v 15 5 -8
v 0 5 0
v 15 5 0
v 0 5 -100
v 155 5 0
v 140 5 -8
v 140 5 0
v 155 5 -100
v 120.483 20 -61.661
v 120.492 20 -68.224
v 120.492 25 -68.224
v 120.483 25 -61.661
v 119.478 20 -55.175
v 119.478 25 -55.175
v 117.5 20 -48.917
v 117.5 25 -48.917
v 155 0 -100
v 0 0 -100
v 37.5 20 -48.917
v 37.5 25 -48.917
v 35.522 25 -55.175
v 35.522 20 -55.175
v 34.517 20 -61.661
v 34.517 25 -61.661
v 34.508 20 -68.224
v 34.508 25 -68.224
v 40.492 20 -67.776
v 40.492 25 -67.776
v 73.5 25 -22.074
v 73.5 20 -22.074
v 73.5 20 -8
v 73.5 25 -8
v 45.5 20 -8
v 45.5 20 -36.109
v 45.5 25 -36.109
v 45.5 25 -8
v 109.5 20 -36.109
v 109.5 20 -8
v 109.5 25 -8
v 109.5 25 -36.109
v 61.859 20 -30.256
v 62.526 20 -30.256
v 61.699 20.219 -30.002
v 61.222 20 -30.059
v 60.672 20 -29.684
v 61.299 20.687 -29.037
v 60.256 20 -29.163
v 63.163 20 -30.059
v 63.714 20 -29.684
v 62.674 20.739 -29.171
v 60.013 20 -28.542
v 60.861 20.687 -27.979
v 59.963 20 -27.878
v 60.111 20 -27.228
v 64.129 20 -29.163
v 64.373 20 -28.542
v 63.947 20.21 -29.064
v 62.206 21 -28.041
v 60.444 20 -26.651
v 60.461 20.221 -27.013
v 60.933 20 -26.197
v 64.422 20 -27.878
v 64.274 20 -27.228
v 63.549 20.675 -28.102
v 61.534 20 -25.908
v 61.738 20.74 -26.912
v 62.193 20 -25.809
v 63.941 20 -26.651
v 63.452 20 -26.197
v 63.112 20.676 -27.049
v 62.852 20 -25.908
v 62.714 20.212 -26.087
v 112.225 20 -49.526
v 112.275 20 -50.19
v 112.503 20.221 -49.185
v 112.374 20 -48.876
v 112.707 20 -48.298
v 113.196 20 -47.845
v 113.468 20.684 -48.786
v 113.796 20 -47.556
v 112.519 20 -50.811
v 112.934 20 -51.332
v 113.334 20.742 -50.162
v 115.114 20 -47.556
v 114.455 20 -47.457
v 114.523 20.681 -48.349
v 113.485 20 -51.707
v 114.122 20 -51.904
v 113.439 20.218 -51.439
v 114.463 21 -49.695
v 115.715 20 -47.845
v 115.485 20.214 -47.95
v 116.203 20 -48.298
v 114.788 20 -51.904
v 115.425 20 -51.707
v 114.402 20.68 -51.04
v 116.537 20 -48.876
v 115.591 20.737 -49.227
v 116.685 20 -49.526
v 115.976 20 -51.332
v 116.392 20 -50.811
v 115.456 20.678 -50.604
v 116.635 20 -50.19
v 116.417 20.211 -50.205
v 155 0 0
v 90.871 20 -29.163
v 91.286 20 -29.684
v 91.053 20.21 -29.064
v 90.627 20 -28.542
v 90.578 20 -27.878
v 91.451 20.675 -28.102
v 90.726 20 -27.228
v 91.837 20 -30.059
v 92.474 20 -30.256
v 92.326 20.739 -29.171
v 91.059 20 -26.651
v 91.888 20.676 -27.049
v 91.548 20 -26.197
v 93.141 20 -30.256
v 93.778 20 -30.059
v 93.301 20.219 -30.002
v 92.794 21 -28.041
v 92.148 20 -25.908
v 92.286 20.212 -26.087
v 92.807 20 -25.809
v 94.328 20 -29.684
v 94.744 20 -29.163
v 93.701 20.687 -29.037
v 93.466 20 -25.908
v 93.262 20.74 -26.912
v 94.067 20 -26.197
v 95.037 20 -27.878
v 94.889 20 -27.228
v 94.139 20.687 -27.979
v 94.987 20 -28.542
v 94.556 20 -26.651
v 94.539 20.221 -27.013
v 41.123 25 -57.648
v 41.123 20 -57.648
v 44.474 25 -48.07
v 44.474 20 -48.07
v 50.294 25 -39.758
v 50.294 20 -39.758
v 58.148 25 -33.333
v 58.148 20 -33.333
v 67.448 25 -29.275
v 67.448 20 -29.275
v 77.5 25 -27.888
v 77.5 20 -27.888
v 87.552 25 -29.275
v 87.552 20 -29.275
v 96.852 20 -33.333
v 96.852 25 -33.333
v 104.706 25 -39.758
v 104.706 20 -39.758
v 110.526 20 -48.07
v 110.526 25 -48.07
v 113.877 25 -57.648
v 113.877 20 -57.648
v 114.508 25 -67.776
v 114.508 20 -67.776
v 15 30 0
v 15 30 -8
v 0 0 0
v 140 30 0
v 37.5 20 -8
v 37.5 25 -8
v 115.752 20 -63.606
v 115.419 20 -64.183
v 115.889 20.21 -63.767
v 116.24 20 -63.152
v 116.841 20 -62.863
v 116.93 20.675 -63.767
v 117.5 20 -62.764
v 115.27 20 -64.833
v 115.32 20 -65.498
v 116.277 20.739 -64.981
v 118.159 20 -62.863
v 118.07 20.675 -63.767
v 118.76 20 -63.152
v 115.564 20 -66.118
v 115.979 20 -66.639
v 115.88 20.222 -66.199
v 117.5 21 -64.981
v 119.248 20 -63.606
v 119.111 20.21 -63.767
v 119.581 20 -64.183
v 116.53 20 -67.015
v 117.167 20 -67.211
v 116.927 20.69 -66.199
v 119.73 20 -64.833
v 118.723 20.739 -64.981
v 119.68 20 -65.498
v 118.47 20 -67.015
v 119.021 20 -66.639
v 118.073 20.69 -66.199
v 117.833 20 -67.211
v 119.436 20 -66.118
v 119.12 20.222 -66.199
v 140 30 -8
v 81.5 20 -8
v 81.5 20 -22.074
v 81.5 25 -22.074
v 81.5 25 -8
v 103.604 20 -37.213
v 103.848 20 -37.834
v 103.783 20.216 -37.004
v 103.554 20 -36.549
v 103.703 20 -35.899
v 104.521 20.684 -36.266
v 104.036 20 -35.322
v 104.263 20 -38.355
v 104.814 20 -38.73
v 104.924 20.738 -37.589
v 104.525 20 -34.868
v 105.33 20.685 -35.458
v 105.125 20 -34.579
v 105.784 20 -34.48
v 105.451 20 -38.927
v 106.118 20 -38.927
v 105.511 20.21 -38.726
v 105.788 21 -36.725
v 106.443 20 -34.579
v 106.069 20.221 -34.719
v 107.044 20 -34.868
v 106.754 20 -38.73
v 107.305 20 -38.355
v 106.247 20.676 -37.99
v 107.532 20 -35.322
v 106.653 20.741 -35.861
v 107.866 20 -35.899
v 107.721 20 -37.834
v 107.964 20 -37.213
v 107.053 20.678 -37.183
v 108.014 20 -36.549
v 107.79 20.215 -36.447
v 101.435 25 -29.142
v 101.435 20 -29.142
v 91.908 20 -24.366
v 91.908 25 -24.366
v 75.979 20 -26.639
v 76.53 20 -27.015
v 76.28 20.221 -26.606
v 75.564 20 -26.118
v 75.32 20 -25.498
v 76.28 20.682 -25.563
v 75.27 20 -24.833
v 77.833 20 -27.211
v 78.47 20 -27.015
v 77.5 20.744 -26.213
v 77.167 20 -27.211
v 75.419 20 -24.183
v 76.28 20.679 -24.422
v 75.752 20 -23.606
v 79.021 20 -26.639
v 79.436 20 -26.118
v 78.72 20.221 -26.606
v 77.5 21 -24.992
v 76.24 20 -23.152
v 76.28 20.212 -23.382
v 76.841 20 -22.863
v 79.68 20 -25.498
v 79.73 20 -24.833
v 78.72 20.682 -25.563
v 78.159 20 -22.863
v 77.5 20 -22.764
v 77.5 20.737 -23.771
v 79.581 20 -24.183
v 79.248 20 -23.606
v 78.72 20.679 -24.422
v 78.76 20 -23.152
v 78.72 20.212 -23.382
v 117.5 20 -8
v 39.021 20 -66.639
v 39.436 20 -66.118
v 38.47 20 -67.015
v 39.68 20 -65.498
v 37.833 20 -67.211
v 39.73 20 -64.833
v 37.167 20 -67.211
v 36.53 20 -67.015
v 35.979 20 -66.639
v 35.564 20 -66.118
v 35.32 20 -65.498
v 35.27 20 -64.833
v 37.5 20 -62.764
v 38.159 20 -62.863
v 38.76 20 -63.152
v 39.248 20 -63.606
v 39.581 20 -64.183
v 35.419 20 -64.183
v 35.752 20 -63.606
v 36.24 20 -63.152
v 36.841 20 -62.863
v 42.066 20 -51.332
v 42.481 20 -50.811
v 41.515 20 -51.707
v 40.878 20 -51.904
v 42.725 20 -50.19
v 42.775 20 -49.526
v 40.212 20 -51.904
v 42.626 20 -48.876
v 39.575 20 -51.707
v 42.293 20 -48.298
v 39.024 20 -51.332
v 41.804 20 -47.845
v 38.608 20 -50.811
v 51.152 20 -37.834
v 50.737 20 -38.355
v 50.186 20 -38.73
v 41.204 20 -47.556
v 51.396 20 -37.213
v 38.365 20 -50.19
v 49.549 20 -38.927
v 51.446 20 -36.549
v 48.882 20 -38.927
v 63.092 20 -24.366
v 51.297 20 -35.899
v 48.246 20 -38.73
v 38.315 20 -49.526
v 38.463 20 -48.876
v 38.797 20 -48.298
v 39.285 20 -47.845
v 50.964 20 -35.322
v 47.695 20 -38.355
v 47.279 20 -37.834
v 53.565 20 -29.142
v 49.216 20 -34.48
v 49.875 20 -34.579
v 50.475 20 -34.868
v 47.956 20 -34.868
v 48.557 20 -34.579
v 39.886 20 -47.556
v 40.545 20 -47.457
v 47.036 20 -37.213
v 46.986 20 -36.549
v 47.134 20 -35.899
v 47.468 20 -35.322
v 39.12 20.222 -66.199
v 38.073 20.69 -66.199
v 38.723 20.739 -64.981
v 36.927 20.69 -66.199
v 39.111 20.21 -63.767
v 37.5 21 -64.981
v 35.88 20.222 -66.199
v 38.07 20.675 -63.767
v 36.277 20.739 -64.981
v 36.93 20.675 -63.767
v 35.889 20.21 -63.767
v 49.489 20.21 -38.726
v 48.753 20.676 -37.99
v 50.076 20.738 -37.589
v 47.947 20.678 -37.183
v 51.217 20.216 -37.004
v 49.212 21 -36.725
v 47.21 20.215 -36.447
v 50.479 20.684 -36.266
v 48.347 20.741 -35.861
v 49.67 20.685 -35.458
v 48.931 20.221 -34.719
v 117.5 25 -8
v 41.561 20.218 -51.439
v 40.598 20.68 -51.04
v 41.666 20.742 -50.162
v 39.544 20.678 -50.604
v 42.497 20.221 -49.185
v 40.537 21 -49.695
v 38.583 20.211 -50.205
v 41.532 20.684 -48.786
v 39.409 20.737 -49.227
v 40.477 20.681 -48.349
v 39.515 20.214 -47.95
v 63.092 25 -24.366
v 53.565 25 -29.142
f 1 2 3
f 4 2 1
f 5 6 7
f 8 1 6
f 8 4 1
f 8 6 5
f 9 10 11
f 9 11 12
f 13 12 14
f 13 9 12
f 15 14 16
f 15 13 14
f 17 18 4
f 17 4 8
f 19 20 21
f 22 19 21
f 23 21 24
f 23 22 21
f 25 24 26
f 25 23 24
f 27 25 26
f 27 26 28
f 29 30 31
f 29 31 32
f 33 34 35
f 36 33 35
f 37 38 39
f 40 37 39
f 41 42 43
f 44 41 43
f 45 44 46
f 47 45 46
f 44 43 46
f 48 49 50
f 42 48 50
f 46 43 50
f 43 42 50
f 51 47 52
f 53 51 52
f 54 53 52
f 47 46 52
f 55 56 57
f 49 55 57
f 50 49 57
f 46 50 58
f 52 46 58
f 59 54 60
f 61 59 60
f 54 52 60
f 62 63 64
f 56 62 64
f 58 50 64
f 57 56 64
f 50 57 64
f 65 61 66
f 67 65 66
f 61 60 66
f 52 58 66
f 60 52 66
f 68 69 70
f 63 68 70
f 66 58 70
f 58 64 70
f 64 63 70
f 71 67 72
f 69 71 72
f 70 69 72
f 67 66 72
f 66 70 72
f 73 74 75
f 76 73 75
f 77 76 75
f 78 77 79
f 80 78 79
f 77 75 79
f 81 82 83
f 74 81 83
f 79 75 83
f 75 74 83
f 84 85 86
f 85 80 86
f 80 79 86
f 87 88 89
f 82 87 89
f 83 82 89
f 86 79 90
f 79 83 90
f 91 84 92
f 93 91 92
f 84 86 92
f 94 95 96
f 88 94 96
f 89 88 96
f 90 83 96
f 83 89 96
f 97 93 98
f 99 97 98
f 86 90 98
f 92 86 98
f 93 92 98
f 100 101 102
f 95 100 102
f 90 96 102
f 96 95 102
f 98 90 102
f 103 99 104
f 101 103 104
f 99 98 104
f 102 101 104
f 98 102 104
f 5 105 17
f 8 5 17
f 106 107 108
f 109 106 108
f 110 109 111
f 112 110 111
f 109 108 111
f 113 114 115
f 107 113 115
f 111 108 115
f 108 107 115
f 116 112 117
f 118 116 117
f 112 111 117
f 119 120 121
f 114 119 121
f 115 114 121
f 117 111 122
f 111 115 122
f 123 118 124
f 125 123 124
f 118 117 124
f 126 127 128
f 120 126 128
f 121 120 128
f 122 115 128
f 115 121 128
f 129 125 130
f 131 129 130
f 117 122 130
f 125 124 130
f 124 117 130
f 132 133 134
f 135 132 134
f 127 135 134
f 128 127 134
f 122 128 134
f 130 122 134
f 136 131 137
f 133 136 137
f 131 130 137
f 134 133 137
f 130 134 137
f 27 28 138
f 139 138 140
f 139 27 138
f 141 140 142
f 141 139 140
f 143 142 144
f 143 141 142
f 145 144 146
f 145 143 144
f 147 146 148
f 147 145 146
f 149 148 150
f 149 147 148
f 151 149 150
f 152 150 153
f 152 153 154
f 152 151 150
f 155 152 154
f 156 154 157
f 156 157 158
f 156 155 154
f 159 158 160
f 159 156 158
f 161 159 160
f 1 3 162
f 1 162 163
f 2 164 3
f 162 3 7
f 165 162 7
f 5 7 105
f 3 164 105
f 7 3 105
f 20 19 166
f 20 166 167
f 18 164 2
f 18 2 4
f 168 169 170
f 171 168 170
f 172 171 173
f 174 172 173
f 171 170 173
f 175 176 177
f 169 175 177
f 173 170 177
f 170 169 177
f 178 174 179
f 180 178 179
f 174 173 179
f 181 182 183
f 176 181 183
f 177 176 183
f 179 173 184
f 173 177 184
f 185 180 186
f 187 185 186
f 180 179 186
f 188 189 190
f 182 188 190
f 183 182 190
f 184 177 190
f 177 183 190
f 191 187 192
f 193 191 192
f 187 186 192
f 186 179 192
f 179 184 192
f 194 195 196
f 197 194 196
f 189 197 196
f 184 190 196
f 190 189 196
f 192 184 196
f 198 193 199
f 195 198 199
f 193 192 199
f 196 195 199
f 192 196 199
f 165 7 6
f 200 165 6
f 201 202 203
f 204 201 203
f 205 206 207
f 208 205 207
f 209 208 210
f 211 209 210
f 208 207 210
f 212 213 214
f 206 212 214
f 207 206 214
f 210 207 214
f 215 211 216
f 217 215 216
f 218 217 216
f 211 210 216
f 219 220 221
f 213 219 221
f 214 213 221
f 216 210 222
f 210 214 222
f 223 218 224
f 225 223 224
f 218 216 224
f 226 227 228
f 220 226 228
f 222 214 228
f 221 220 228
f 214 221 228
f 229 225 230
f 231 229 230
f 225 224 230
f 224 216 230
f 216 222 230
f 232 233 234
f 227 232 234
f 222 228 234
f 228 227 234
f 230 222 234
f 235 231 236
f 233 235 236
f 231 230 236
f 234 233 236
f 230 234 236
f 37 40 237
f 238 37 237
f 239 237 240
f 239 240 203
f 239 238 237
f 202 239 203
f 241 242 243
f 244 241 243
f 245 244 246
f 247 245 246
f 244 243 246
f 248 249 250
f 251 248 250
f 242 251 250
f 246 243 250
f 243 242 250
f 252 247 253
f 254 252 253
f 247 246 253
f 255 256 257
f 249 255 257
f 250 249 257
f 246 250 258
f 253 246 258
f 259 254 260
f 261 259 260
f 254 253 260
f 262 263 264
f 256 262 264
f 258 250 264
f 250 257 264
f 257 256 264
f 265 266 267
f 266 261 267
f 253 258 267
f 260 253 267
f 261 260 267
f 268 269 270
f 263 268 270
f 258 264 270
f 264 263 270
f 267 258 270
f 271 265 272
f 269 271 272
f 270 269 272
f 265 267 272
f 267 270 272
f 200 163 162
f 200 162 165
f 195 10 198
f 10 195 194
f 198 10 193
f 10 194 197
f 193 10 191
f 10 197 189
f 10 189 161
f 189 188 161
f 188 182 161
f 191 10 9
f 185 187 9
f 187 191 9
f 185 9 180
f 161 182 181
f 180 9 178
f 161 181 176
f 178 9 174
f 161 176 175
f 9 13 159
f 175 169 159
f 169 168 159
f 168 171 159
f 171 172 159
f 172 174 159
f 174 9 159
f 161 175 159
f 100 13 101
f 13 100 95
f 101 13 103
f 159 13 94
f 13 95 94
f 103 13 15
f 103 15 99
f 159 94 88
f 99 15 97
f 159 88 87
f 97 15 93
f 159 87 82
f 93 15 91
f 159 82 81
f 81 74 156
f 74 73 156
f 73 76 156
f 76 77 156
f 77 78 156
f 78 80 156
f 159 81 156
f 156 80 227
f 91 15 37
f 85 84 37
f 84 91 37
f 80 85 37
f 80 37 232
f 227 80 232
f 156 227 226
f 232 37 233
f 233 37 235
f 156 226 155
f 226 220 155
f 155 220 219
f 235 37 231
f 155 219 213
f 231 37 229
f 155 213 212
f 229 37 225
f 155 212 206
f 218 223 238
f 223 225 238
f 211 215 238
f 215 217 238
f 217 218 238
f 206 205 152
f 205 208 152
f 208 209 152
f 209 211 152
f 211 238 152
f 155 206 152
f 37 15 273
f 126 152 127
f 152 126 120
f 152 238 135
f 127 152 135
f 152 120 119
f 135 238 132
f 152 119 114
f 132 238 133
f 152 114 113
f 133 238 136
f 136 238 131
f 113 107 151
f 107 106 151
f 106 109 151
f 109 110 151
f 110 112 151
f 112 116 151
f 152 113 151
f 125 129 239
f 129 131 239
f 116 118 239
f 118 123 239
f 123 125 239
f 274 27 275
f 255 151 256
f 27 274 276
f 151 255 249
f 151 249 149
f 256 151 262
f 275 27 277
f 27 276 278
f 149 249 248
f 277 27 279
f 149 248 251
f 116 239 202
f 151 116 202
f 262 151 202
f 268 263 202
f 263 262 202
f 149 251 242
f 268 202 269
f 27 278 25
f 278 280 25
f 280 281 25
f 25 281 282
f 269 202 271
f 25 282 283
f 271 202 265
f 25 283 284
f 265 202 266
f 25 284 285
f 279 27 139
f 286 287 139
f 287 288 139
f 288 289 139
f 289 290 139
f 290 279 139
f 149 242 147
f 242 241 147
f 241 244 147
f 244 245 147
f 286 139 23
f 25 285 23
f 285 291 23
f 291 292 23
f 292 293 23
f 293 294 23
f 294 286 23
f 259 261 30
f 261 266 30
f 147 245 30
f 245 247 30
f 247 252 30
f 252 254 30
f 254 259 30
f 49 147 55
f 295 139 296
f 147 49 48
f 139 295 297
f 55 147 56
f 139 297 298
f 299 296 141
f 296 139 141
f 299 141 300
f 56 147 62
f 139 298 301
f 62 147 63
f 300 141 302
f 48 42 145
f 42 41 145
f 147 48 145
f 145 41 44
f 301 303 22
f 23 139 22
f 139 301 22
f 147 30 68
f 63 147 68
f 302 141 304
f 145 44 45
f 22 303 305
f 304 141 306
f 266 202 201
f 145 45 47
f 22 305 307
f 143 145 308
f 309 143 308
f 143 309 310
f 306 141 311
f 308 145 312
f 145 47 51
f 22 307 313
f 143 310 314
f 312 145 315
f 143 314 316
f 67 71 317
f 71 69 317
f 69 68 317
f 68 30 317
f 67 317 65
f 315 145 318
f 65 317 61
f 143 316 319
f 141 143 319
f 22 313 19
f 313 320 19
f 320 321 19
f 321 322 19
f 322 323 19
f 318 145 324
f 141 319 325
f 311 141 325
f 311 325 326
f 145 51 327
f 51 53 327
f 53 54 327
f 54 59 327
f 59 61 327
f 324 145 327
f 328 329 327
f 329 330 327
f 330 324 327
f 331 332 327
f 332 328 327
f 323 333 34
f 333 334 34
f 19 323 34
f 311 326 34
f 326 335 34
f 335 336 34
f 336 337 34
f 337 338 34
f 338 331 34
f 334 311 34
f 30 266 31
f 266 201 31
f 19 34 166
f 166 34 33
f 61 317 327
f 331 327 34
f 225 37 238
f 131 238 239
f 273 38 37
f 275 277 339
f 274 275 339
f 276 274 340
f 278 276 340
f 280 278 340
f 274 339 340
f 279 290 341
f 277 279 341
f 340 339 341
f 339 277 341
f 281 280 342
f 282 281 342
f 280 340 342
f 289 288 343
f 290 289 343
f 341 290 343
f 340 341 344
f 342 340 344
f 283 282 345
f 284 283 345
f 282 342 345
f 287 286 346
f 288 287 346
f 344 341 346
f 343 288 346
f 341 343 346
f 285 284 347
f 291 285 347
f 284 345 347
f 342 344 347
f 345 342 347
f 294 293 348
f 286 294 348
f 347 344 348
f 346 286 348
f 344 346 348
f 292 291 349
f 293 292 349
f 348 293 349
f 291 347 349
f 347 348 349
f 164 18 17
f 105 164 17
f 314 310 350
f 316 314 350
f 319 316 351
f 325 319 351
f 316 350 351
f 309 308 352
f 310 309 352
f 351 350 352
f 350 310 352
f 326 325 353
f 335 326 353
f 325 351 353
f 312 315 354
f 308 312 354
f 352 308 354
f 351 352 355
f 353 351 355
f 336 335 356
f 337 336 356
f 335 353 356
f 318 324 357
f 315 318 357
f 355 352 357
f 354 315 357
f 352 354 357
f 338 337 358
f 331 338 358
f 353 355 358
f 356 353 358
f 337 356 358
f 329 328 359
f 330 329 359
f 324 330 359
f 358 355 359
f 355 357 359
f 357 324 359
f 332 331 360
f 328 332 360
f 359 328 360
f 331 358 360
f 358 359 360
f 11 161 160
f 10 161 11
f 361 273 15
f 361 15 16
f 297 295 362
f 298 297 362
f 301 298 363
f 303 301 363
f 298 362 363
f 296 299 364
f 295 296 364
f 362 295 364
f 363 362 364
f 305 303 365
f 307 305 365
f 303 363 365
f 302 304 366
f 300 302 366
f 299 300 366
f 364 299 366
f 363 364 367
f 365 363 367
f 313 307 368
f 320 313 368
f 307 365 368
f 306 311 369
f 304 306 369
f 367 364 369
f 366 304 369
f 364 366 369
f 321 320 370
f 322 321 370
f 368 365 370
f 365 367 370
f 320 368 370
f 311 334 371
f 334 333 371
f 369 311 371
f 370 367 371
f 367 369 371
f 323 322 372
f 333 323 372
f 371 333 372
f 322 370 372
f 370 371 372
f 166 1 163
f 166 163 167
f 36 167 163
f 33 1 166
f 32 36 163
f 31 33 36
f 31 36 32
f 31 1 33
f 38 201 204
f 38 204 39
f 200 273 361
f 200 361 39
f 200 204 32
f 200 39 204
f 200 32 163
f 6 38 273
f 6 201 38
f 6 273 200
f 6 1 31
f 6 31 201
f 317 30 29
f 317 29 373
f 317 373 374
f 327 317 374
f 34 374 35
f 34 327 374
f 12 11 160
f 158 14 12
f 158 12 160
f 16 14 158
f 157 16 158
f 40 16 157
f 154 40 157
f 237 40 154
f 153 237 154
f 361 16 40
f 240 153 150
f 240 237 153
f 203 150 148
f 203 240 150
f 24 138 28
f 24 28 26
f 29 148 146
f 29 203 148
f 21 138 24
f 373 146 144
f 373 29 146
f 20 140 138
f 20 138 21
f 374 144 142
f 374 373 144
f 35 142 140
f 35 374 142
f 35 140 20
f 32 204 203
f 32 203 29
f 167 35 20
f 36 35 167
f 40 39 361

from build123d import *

# Parameters (mm, degrees)
SKETCH_1_W               = 155
SKETCH_1_H               = 100
EXTRUDE_1_DEPTH          = 5
SKETCH_2_W               = 125
SKETCH_2_H               = 8
EXTRUDE_2_DEPTH          = 25
EXTRUDE_6_DEPTH          = 20
EXTRUDE_7_REACH          = 184.727
EXTRUDE_7_END_RADIUS     = 43.11234224
SKETCH_11_W              = 8
SKETCH_11_H              = 5
SKETCH_12_W              = 125
SKETCH_12_H              = 15
CUT_EXTRUDE_1_DEPTH      = 130
PATTERN_CIRCULAR_1_COUNT = 5
PATTERN_CIRCULAR_1_ANGLE = 90
F_1_THE_OTHER_WAY_COUNT  = 5
F_1_THE_OTHER_WAY_ANGLE  = 90


with BuildPart() as part:
    # 草图1 → 凸台-拉伸1 (new body)
    with BuildSketch(Plane(origin=(0, 0, 0), x_dir=(1, 0, 0), z_dir=(0, 1, 0))):
        with Locations((77.5, 50)):
            Rectangle(SKETCH_1_W, SKETCH_1_H)
    extrude(amount=EXTRUDE_1_DEPTH)

    # 草图2 → 凸台-拉伸2 (add)
    with BuildSketch(Plane(origin=(0, 5, 0), x_dir=(1, 0, 0), z_dir=(0, 1, 0))):
        with Locations((77.5, 4)):
            Rectangle(SKETCH_2_W, SKETCH_2_H)
    extrude(amount=EXTRUDE_2_DEPTH)

    # 草图7 → 凸台-拉伸6 (add)
    with BuildSketch(Plane(origin=(0, 5, 0), x_dir=(1, 0, 0), z_dir=(0, 1, 0))):
        with BuildLine():
            Line((34.50840207, 68.224369845), (40.49159793, 67.775630155))
            ThreePointArc((40.49159793, 67.775630155), (77.5, 27.88765776), (114.50840207, 67.775630155))
            Line((114.50840207, 67.775630155), (120.49159793, 68.224369845))
            ThreePointArc((120.49159793, 68.224369845), (77.5, 21.88765776), (34.50840207, 68.224369845))
        make_face()
    extrude(amount=EXTRUDE_6_DEPTH)

    # 凸台-拉伸7: up to this cylinder (the profile starts outside it)
    extrude_7_end = Plane(origin=(77.5, 22.5, -65), z_dir=(0, -1, 0)) * Cylinder(EXTRUDE_7_END_RADIUS, 456.67868448, mode=Mode.PRIVATE)
    # 草图11 → 凸台-拉伸7 (add, up to the surface)
    with BuildSketch(Plane(origin=(0, 0, -8), x_dir=(-1, 0, 0), z_dir=(0, 0, -1)), mode=Mode.PRIVATE) as extrude_7_sk1:
        with Locations((-77.5, 22.5)):
            Rectangle(SKETCH_11_W, SKETCH_11_H)
    extrude_7_tool1 = extrude(extrude_7_sk1.sketch, amount=EXTRUDE_7_REACH, mode=Mode.PRIVATE) - extrude_7_end
    add(extrude_7_tool1.solids().sort_by_distance((77.5, 22.5, -8))[0])
    # 草图11 → 凸台-拉伸7 (add, up to the surface)
    with BuildSketch(Plane(origin=(0, 0, -8), x_dir=(-1, 0, 0), z_dir=(0, 0, -1)), mode=Mode.PRIVATE) as extrude_7_sk2:
        with Locations((-41.5, 22.5)):
            Rectangle(SKETCH_11_W, SKETCH_11_H)
    extrude_7_tool2 = extrude(extrude_7_sk2.sketch, amount=EXTRUDE_7_REACH, mode=Mode.PRIVATE) - extrude_7_end
    add(extrude_7_tool2.solids().sort_by_distance((41.5, 22.5, -8))[0])
    # 草图11 → 凸台-拉伸7 (add, up to the surface)
    with BuildSketch(Plane(origin=(0, 0, -8), x_dir=(-1, 0, 0), z_dir=(0, 0, -1)), mode=Mode.PRIVATE) as extrude_7_sk3:
        with Locations((-113.5, 22.5)):
            Rectangle(SKETCH_11_W, SKETCH_11_H)
    extrude_7_tool3 = extrude(extrude_7_sk3.sketch, amount=EXTRUDE_7_REACH, mode=Mode.PRIVATE) - extrude_7_end
    add(extrude_7_tool3.solids().sort_by_distance((113.5, 22.5, -8))[0])

    # 草图12 → 切除-拉伸1 (cut)
    with BuildSketch(Plane(origin=(0, 0, -8), x_dir=(-1, 0, 0), z_dir=(0, 0, -1))):
        with Locations((-77.5, 12.5)):
            Rectangle(SKETCH_12_W, SKETCH_12_H)
    extrude(amount=CUT_EXTRUDE_1_DEPTH, mode=Mode.SUBTRACT)

    # 草图16 → 切除-旋转3 (revolve, cut)
    with BuildSketch(Plane(origin=(0, 18, 0), x_dir=(-1, 0, 0), z_dir=(0, -1, 0))):
        with BuildLine():
            Line((-80.5, 25), (-74.5, 25))
            ThreePointArc((-74.5, 25), (-77.5, 22), (-80.5, 25))
        make_face()
    cut_revolve_3 = revolve(axis=Axis((74.5, 18, -25), (1, 0, 0)), mode=Mode.SUBTRACT)

    # 阵列(圆周)1: 切除-旋转3 ×5 about axis
    pattern_circular_1_axis = Axis((77.5, 0, -65), (0, -1, 0))
    for i in range(1, PATTERN_CIRCULAR_1_COUNT):
        add(cut_revolve_3.rotate(pattern_circular_1_axis, i * PATTERN_CIRCULAR_1_ANGLE / (PATTERN_CIRCULAR_1_COUNT - 1)), mode=Mode.SUBTRACT)

    # 1 the other way: 切除-旋转3 ×5 about axis
    f_1_the_other_way_axis = Axis((77.5, 0, -65), (0, 1, 0))
    for i in range(1, F_1_THE_OTHER_WAY_COUNT):
        add(cut_revolve_3.rotate(f_1_the_other_way_axis, i * F_1_THE_OTHER_WAY_ANGLE / (F_1_THE_OTHER_WAY_COUNT - 1)), mode=Mode.SUBTRACT)


solid = part.part
